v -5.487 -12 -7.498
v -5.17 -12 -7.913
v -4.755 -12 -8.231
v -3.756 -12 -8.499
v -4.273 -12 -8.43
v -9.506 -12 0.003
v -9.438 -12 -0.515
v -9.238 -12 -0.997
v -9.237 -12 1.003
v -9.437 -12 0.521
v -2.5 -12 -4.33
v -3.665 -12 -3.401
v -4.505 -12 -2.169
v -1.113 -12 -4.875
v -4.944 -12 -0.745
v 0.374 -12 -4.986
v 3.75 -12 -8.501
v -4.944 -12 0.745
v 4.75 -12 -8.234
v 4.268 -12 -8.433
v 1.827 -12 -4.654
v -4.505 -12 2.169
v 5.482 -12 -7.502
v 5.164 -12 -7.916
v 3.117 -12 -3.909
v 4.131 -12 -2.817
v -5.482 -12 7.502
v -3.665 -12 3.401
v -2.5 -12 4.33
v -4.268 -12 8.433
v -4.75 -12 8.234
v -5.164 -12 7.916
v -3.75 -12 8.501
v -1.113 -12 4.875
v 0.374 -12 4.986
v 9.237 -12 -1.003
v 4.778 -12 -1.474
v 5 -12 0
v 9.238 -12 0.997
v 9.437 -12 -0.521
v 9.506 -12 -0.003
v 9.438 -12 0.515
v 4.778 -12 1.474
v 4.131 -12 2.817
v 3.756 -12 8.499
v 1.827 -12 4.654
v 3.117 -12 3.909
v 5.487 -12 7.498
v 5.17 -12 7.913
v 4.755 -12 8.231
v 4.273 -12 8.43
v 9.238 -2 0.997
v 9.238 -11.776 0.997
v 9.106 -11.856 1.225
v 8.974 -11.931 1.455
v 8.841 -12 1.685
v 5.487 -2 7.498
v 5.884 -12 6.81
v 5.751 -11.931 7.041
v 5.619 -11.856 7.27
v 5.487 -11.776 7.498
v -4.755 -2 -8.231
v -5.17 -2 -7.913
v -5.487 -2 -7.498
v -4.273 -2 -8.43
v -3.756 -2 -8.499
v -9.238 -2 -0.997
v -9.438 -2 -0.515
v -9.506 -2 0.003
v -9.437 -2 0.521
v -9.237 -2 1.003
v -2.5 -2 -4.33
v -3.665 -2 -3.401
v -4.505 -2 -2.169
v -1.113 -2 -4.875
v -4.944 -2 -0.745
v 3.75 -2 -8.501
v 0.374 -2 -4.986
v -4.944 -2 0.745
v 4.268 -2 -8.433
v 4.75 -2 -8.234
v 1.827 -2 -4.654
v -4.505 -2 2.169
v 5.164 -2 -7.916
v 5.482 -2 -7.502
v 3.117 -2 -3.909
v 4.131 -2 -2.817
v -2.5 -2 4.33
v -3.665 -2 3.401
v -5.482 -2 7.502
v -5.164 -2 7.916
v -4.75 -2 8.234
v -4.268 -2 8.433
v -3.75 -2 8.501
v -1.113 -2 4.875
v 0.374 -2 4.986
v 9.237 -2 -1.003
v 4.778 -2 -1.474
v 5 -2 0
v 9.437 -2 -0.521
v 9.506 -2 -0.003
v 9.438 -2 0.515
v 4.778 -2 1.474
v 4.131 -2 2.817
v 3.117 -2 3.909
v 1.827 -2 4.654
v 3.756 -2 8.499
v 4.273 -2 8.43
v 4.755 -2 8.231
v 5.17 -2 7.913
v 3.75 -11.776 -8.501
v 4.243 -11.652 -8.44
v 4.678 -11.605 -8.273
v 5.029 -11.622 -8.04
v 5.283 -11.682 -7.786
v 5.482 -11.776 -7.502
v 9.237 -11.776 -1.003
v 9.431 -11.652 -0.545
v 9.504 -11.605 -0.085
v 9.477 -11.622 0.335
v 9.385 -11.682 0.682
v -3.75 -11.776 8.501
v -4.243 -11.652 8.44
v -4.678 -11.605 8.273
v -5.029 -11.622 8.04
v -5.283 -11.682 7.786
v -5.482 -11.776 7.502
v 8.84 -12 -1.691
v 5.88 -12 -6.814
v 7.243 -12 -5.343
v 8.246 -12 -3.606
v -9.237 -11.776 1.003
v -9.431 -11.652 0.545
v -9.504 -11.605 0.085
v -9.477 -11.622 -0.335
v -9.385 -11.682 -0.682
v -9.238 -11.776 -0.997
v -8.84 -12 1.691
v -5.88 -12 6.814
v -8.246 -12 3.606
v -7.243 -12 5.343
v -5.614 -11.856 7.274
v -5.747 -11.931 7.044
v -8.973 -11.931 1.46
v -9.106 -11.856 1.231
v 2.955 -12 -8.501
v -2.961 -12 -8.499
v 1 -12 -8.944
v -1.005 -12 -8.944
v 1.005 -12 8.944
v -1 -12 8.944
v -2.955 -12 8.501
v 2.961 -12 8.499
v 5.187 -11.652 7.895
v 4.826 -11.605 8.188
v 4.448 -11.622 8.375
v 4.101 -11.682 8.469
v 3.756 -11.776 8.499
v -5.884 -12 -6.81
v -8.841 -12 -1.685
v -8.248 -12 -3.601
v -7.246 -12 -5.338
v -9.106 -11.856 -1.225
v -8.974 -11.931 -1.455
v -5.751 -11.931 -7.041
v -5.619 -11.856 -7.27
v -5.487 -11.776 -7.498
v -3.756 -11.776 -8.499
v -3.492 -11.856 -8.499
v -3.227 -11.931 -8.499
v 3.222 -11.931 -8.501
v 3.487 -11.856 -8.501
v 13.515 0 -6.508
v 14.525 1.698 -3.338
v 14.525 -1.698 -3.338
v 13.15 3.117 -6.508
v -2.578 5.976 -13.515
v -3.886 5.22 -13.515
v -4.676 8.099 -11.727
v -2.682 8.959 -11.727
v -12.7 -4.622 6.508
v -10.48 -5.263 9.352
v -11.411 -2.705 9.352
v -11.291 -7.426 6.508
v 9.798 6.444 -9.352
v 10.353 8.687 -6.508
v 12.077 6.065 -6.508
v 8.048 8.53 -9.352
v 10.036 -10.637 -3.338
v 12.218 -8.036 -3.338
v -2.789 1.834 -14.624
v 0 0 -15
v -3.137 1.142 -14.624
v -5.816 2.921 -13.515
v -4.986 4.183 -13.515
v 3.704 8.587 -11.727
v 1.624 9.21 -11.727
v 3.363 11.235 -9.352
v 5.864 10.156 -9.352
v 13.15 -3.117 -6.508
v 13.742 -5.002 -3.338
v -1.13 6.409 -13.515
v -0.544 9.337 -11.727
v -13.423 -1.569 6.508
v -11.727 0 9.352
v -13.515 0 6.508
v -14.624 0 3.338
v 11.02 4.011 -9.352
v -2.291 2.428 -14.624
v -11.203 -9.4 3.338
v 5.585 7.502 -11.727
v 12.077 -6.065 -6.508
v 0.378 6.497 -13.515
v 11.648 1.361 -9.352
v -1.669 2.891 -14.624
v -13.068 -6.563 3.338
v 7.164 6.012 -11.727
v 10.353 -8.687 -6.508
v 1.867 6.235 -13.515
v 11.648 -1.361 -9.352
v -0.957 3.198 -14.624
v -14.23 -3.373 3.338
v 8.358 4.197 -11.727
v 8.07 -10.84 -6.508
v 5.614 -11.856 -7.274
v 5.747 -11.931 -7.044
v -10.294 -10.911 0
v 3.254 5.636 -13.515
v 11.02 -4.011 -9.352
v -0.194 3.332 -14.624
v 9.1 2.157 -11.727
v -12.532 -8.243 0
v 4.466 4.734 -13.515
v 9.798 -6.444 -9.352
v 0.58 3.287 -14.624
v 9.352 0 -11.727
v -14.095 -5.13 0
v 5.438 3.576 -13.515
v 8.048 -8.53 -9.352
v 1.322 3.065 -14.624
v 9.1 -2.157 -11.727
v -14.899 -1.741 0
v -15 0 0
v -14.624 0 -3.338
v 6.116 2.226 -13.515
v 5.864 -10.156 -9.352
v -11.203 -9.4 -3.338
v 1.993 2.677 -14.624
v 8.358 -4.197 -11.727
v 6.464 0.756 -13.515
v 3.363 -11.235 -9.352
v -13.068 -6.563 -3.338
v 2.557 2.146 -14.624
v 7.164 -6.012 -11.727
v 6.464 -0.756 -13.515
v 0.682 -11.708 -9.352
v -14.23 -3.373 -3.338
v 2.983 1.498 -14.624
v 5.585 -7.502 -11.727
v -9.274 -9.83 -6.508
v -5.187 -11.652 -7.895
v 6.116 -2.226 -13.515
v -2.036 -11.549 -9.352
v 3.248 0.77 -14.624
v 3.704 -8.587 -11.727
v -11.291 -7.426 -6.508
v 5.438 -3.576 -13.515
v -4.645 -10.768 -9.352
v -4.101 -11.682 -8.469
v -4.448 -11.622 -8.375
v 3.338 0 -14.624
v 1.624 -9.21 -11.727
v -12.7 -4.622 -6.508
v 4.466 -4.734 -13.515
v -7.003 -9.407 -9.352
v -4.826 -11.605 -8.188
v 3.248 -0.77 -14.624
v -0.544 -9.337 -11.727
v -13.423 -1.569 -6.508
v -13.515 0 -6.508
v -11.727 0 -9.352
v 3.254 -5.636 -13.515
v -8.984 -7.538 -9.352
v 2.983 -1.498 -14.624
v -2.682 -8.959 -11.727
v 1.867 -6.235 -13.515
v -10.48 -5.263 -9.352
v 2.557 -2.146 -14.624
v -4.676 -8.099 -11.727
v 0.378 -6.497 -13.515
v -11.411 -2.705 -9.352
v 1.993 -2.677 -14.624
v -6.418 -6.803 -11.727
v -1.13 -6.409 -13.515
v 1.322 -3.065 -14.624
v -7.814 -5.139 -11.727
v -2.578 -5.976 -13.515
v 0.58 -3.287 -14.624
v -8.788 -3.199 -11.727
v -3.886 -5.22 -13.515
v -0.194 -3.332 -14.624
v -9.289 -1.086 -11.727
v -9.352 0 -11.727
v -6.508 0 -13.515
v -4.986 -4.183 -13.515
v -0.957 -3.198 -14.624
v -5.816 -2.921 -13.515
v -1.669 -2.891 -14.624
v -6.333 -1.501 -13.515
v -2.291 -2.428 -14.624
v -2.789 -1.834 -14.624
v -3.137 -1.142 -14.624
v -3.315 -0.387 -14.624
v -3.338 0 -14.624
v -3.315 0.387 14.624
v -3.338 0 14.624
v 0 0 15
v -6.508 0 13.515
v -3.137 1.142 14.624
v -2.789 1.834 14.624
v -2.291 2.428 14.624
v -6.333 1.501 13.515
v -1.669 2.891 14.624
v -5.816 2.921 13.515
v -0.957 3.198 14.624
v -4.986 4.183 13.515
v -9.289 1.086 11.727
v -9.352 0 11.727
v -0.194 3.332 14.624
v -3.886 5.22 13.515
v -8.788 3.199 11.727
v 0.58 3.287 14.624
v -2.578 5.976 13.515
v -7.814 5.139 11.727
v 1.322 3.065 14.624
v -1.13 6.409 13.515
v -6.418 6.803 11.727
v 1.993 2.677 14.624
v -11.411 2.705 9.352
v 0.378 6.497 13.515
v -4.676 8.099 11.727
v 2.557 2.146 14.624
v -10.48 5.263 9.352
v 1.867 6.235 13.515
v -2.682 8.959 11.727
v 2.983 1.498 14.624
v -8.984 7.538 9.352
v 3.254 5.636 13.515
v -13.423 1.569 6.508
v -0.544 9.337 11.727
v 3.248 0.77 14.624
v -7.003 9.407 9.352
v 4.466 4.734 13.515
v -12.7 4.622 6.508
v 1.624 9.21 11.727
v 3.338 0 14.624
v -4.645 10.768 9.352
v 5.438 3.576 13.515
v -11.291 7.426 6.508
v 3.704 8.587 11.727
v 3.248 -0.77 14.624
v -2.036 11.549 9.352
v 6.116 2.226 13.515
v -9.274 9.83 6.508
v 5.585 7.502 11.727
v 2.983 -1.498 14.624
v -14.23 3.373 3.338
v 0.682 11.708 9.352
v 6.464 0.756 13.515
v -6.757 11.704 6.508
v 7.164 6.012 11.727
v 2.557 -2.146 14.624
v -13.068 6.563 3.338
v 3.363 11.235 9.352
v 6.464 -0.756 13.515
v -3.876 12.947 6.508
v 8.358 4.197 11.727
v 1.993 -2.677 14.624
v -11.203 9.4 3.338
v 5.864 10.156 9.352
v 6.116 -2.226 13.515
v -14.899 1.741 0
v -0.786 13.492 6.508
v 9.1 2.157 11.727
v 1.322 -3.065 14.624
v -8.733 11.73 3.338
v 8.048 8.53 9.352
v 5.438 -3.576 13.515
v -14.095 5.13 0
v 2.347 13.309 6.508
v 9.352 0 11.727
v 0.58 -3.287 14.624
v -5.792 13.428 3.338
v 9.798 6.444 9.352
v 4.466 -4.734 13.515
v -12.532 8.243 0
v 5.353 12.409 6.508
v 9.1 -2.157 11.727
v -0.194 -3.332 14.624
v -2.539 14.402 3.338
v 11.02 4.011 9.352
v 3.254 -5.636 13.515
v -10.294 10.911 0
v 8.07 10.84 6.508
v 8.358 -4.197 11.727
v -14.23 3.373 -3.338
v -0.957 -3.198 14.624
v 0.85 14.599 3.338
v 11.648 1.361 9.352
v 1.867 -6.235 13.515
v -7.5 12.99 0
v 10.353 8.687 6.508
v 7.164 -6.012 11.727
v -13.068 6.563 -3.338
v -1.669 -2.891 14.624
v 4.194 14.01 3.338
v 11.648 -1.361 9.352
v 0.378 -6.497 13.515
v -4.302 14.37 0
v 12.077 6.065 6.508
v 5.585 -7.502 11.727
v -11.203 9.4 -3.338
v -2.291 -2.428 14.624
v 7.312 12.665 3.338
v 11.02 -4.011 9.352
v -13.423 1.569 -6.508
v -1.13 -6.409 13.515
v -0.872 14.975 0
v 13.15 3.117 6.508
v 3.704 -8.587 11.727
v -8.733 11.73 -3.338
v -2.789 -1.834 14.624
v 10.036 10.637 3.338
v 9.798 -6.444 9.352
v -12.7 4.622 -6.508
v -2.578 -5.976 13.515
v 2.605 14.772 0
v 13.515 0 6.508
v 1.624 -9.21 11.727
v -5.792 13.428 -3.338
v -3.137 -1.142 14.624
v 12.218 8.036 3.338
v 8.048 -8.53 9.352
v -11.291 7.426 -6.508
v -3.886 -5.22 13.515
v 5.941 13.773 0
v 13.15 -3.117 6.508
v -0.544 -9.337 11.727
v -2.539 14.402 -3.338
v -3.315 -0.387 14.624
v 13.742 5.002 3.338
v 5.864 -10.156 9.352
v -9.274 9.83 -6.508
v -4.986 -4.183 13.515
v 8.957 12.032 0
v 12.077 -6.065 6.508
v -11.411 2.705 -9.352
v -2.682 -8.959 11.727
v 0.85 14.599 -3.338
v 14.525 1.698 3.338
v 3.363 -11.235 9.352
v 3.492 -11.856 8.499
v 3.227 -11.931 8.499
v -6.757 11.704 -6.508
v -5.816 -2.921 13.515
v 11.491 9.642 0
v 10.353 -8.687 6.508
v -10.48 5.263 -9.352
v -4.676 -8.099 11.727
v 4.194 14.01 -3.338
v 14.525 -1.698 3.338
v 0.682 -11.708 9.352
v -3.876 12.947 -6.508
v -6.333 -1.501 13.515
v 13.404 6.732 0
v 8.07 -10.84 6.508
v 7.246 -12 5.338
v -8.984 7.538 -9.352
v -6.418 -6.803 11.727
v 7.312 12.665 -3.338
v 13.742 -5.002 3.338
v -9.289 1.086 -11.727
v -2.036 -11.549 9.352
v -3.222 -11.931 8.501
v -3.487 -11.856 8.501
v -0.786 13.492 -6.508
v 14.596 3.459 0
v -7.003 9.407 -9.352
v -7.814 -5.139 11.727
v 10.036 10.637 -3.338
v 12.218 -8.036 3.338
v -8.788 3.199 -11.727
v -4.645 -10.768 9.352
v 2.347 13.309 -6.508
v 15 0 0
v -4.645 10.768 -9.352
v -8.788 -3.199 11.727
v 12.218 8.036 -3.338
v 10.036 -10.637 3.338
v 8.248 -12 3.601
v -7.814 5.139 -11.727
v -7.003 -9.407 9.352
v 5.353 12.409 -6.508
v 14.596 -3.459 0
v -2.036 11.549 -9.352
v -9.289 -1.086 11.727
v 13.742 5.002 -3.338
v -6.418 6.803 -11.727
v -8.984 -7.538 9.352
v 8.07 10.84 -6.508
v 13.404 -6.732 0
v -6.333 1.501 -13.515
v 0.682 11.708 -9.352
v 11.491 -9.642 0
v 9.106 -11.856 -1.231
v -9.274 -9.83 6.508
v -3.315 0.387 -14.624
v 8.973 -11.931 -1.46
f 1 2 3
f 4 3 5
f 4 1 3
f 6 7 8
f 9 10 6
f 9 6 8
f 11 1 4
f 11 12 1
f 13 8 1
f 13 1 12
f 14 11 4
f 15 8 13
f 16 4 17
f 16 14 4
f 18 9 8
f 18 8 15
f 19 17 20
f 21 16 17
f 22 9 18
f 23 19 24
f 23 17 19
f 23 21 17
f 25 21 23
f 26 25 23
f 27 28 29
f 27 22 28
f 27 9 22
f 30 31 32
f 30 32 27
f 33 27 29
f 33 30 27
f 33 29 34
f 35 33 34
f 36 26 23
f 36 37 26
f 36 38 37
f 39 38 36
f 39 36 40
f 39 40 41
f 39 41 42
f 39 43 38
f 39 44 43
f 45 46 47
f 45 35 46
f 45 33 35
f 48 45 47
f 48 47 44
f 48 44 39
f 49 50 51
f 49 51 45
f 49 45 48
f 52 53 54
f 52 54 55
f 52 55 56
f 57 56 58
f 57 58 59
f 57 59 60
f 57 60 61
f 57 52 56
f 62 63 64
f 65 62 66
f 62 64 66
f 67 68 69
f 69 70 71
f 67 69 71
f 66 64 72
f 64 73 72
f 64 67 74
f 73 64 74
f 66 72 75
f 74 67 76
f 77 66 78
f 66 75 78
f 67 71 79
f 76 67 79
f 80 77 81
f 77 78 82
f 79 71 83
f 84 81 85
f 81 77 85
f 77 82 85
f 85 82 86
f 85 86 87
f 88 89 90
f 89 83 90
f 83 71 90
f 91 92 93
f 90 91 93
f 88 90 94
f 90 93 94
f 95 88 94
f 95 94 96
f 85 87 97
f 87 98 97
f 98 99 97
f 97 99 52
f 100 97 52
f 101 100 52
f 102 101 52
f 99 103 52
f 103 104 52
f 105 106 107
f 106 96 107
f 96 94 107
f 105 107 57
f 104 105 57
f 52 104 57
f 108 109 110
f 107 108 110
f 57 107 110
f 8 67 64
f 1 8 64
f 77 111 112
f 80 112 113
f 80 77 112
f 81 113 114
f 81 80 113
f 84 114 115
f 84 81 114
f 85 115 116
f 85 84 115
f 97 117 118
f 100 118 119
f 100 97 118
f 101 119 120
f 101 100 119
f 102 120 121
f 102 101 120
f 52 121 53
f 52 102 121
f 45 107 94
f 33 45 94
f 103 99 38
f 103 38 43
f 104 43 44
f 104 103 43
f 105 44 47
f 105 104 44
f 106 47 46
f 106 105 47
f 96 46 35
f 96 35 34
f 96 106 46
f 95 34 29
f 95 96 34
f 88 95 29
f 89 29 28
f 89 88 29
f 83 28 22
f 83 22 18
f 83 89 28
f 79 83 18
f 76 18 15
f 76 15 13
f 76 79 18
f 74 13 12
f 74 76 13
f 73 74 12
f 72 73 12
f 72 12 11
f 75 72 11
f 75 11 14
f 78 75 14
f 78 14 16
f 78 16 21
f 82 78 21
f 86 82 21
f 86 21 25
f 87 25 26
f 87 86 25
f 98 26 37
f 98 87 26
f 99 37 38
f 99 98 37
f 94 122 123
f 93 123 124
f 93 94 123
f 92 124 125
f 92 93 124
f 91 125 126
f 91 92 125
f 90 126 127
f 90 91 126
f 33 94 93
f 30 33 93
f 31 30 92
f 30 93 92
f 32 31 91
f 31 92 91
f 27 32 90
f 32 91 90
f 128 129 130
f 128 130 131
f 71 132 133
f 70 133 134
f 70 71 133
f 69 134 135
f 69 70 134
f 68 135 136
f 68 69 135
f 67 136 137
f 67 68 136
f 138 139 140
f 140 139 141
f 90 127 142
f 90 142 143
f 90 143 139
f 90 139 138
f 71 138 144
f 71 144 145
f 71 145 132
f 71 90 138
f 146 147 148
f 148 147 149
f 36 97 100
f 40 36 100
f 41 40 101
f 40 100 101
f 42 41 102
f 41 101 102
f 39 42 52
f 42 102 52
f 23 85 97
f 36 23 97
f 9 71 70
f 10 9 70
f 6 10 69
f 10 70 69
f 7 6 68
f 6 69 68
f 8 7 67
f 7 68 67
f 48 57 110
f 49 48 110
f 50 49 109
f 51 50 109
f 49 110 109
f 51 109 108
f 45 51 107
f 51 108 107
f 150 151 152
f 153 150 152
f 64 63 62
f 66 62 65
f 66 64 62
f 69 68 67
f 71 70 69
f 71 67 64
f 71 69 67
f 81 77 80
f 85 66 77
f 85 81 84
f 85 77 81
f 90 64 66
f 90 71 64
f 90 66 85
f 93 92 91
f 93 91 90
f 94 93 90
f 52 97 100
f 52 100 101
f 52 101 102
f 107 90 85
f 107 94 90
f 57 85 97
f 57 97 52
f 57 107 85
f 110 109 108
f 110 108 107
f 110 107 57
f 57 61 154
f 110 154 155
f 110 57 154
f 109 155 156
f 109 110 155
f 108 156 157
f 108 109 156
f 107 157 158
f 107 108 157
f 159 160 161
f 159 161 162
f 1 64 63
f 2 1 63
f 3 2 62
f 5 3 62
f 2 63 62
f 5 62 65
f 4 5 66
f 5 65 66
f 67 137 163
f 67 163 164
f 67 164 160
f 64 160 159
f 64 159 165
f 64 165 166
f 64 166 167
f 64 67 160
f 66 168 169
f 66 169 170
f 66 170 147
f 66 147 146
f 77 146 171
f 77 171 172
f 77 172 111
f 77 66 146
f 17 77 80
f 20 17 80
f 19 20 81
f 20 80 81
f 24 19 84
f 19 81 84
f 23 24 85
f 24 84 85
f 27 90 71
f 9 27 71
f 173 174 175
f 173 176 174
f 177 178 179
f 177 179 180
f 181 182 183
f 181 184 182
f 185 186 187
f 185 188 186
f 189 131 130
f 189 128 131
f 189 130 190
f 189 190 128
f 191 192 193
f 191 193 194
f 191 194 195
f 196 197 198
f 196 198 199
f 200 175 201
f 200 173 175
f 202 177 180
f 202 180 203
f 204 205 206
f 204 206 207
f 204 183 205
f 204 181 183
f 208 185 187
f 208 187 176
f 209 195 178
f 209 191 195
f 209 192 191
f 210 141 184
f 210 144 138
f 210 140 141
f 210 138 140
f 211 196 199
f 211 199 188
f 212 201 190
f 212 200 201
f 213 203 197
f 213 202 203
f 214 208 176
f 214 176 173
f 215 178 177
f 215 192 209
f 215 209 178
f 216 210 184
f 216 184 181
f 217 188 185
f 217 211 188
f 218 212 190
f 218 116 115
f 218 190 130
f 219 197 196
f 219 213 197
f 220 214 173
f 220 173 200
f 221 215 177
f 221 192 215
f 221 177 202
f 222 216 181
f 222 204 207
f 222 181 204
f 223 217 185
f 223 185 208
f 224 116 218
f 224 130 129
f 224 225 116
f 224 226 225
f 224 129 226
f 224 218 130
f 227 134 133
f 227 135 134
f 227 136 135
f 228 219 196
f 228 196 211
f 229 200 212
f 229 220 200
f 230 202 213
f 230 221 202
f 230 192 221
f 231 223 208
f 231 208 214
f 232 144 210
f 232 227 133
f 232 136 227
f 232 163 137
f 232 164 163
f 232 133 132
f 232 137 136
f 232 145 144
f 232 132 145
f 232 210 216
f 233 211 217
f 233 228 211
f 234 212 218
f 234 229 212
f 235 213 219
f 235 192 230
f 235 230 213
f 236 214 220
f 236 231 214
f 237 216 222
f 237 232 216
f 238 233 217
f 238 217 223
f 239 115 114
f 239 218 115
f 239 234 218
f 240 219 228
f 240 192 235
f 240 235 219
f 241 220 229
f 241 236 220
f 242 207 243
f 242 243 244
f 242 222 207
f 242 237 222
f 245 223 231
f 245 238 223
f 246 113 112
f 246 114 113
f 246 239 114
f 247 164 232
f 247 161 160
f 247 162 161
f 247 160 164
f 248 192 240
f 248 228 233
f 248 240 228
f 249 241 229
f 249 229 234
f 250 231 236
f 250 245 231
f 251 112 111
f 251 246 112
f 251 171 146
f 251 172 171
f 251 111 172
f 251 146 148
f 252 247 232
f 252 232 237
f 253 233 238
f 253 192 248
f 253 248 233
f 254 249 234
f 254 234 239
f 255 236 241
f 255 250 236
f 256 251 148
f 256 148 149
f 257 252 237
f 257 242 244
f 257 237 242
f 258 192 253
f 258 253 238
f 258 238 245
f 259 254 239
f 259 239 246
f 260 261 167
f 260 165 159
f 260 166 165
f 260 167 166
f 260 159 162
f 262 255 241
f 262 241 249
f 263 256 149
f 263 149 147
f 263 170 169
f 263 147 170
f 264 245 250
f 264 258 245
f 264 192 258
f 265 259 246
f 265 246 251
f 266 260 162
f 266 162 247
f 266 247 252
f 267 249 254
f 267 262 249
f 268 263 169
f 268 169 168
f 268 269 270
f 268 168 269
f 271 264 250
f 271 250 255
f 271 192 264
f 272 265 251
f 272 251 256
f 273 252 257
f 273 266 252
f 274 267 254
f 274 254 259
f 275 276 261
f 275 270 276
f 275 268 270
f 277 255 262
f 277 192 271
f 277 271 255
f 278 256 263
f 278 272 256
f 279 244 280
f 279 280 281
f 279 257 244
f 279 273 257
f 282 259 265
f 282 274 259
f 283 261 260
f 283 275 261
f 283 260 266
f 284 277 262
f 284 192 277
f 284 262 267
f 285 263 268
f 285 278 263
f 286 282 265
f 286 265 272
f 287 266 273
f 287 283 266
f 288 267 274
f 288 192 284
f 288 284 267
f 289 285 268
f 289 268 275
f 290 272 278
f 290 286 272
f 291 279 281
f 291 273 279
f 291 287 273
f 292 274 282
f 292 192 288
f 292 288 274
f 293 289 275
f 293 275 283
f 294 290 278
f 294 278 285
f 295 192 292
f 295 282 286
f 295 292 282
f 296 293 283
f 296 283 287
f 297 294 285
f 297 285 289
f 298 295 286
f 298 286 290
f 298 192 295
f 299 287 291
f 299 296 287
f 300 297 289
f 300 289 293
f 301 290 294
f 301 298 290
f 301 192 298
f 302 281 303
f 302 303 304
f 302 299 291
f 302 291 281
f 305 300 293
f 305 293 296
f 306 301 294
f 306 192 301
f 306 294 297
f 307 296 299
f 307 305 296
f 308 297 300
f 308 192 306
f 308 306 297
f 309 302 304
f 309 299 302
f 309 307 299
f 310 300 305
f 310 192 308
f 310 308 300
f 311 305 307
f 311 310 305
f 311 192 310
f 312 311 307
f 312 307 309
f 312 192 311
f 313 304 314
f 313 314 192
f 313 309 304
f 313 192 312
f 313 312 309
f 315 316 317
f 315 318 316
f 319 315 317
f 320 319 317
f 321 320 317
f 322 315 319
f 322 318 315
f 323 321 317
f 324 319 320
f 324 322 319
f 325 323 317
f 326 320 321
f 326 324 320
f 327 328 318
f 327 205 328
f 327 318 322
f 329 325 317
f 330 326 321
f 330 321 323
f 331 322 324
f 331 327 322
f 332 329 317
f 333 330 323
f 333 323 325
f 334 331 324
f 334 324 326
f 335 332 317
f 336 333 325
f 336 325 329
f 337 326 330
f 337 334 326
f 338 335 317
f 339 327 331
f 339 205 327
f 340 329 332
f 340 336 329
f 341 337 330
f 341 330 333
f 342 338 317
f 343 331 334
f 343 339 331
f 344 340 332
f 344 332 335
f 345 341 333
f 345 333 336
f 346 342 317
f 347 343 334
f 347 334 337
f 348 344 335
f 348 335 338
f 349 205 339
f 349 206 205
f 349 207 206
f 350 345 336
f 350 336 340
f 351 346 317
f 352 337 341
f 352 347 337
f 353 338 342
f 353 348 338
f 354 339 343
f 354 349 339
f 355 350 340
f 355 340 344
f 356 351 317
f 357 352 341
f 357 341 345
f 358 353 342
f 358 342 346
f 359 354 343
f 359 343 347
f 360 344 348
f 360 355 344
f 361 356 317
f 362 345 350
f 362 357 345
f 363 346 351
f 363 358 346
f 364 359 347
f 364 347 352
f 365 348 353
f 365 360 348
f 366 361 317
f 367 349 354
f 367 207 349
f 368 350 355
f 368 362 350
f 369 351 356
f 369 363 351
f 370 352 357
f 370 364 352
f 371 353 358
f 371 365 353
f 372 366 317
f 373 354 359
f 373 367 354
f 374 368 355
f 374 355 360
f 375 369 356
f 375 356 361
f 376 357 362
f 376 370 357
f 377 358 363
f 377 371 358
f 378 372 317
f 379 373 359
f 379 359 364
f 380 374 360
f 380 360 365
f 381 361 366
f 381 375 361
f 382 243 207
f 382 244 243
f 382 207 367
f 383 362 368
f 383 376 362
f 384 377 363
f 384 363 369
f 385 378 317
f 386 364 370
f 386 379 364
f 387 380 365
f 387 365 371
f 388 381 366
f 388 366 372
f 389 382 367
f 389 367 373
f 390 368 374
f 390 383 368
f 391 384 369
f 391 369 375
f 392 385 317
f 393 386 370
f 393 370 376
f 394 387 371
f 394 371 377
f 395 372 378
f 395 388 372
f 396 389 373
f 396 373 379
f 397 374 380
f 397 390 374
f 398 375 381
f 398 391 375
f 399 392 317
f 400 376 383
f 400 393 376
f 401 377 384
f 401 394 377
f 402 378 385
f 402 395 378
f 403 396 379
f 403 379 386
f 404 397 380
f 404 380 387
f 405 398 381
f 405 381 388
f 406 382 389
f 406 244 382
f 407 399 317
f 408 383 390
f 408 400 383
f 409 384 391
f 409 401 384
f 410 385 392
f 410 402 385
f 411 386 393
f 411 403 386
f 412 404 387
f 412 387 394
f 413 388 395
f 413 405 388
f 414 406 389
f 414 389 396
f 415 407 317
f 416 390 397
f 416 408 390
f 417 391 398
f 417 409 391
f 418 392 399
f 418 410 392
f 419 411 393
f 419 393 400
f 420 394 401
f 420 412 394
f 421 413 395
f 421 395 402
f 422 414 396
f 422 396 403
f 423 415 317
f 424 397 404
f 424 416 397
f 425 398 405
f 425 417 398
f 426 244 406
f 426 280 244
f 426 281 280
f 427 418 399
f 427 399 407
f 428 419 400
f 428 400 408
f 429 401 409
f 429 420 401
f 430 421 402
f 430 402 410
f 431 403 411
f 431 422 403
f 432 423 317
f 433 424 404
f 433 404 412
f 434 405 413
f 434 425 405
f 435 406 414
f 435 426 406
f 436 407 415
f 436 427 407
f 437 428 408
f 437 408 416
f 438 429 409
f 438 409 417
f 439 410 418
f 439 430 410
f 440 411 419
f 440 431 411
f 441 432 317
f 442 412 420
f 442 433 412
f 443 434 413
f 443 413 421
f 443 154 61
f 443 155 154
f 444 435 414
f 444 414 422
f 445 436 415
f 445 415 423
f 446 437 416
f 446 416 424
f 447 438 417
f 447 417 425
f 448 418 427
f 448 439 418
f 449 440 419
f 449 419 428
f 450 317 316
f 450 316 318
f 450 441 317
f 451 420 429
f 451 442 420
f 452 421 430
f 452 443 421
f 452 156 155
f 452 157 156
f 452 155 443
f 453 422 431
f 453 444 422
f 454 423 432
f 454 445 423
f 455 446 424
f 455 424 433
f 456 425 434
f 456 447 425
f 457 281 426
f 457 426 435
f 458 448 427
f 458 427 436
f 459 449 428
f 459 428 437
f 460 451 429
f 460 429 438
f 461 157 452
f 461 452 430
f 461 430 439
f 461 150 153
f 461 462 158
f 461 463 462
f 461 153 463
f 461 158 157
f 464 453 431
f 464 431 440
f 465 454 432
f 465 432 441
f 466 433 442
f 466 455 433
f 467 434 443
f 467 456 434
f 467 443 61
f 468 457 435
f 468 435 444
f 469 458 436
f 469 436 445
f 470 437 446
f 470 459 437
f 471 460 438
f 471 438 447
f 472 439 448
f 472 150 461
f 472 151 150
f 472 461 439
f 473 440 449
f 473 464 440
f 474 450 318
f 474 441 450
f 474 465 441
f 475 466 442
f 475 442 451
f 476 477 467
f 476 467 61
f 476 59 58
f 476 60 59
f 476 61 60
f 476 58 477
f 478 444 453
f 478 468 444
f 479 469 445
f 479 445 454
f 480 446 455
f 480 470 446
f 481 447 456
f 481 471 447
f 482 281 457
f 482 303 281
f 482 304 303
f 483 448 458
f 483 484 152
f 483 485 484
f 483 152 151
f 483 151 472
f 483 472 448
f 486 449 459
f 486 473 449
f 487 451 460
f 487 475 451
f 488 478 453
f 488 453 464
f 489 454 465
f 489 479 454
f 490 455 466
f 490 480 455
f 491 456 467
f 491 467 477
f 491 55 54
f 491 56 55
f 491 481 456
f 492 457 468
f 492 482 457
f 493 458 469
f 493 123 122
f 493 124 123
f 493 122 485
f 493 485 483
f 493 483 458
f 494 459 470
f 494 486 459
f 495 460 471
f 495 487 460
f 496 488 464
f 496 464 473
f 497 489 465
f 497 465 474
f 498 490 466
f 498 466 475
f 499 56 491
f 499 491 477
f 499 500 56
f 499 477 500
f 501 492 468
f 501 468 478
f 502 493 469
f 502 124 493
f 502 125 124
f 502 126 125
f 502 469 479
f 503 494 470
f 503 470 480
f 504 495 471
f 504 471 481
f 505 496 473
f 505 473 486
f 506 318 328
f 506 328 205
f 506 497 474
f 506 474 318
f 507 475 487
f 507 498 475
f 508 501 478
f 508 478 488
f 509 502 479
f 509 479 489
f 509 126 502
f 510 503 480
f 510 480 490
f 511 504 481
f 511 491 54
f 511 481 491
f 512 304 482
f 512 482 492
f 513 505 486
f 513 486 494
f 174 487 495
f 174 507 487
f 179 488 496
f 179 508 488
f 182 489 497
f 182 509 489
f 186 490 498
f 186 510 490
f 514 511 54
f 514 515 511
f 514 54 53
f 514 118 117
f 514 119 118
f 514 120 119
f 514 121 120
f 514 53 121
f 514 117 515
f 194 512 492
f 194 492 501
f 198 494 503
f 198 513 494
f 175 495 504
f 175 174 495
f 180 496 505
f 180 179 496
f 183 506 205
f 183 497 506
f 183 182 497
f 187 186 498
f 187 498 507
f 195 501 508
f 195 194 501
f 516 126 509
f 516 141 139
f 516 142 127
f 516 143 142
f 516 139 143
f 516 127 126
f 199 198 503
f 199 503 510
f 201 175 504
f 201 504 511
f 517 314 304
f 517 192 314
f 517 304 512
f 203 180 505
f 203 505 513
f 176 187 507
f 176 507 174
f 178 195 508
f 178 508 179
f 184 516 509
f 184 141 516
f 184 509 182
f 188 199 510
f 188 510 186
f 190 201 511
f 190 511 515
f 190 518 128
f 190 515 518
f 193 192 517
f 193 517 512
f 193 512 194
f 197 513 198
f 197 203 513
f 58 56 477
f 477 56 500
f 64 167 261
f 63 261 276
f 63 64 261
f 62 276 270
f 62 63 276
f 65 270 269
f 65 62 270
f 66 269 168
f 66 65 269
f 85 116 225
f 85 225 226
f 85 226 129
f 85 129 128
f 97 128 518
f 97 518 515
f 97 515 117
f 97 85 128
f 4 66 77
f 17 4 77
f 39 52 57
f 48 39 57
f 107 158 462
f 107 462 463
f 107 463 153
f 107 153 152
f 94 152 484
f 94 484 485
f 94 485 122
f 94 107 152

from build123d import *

# Parameters (mm, degrees)
F3_START = 2
F2_R     = 5
F3_DEPTH = 10
F4_W     = 45
F4_H     = 45
F4_R     = 5
F5_DEPTH = 25
F7_R     = 5
F8_DEPTH = 10


with BuildPart() as f1:
    # F0 (on Front) → F1 (revolve)
    with BuildSketch(Plane.XZ):
        with BuildLine():
            Line((0, -15), (0, 15))
            ThreePointArc((0, 15), (-15, 0), (0, -15))
        make_face()
    revolve(axis=Axis((0, 0, -1.5722160553), (0, 0, -1)))

    # F4 (on face) → F5 (cut)
    with BuildSketch(Plane.XZ.offset(12)):
        Rectangle(F4_W, F4_H)
        with BuildLine():
            Line((9.2372830265, -1.00296342), (5.4824212361, -7.5017591752))
            ThreePointArc((5.4824212361, -7.5017591752), (4.7501356205, -8.2335750994), (3.7500497125, -8.5012034729))
            Line((3.7500497125, -8.5012034729), (-3.7555034008, -8.4987956523))
            ThreePointArc((-3.7555034008, -8.4987956523), (-4.7554173898, -8.2305256685), (-5.487233314, -7.4982400529))
            Line((-5.487233314, -7.4982400529), (-9.2379246369, -0.9970364771))
            ThreePointArc((-9.2379246369, -0.9970364771), (-9.5055530103, 0.0030494309), (-9.2372830265, 1.00296342))
            Line((-9.2372830265, 1.00296342), (-5.4824212361, 7.5017591752))
            ThreePointArc((-5.4824212361, 7.5017591752), (-4.7501356205, 8.2335750994), (-3.7500497125, 8.5012034729))
            Line((-3.7500497125, 8.5012034729), (3.7555034008, 8.4987956523))
            ThreePointArc((3.7555034008, 8.4987956523), (4.7554173898, 8.2305256685), (5.487233314, 7.4982400529))
            Line((5.487233314, 7.4982400529), (9.2379246369, 0.9970364771))
            ThreePointArc((9.2379246369, 0.9970364771), (9.5055530103, -0.0030494309), (9.2372830265, -1.00296342))
        make_face(mode=Mode.SUBTRACT)
        with BuildLine():
            ThreePointArc((3.7500497125, -8.5012034729), (4.7501356205, -8.2335750994), (5.4824212361, -7.5017591752))
            Line((5.4824212361, -7.5017591752), (9.2372830265, -1.00296342))
            ThreePointArc((9.2372830265, -1.00296342), (9.5055530103, -0.0030494309), (9.2379246369, 0.9970364771))
            Line((9.2379246369, 0.9970364771), (5.487233314, 7.4982400529))
            ThreePointArc((5.487233314, 7.4982400529), (4.7554173898, 8.2305256685), (3.7555034008, 8.4987956523))
            Line((3.7555034008, 8.4987956523), (-3.7500497125, 8.5012034729))
            ThreePointArc((-3.7500497125, 8.5012034729), (-4.7501356205, 8.2335750994), (-5.4824212361, 7.5017591752))
            Line((-5.4824212361, 7.5017591752), (-9.2372830265, 1.00296342))
            ThreePointArc((-9.2372830265, 1.00296342), (-9.5055530103, 0.0030494309), (-9.2379246369, -0.9970364771))
            Line((-9.2379246369, -0.9970364771), (-5.487233314, -7.4982400529))
            ThreePointArc((-5.487233314, -7.4982400529), (-4.7554173898, -8.2305256685), (-3.7555034008, -8.4987956523))
            Line((-3.7555034008, -8.4987956523), (3.7500497125, -8.5012034729))
        make_face()
        Circle(F4_R, mode=Mode.SUBTRACT)
    extrude(amount=F5_DEPTH, mode=Mode.SUBTRACT)


with BuildPart() as f3:
    # F2 (on Front) → F3 (new body)
    with BuildSketch(Plane.XZ.offset(F3_START)):
        with BuildLine():
            Line((9.2379246369, 0.9970364771), (5.487233314, 7.4982400529))
            ThreePointArc((5.487233314, 7.4982400529), (4.7554173898, 8.2305256685), (3.7555034008, 8.4987956523))
            Line((3.7555034008, 8.4987956523), (-3.7500497125, 8.5012034729))
            ThreePointArc((-3.7500497125, 8.5012034729), (-4.7501356205, 8.2335750994), (-5.4824212361, 7.5017591752))
            Line((-5.4824212361, 7.5017591752), (-9.2372830265, 1.00296342))
            ThreePointArc((-9.2372830265, 1.00296342), (-9.5055530103, 0.0030494309), (-9.2379246369, -0.9970364771))
            Line((-9.2379246369, -0.9970364771), (-5.487233314, -7.4982400529))
            ThreePointArc((-5.487233314, -7.4982400529), (-4.7554173898, -8.2305256685), (-3.7555034008, -8.4987956523))
            Line((-3.7555034008, -8.4987956523), (3.7500497125, -8.5012034729))
            ThreePointArc((3.7500497125, -8.5012034729), (4.7501356205, -8.2335750994), (5.4824212361, -7.5017591752))
            Line((5.4824212361, -7.5017591752), (9.2372830265, -1.00296342))
            ThreePointArc((9.2372830265, -1.00296342), (9.5055530103, -0.0030494309), (9.2379246369, 0.9970364771))
        make_face()
        Circle(F2_R, mode=Mode.SUBTRACT)
    extrude(amount=F3_DEPTH)


with BuildPart() as f1_1:
    add(f1.part)

    # F6: cut F3
    add(f3.part, mode=Mode.SUBTRACT)

    # F7 (on face) → F8 (cut, symmetric)
    with BuildSketch(Plane.XZ.offset(12)):
        Circle(F7_R)
    extrude(amount=F8_DEPTH, both=True, mode=Mode.SUBTRACT)


solid = Compound([f3.part, f1_1.part])
